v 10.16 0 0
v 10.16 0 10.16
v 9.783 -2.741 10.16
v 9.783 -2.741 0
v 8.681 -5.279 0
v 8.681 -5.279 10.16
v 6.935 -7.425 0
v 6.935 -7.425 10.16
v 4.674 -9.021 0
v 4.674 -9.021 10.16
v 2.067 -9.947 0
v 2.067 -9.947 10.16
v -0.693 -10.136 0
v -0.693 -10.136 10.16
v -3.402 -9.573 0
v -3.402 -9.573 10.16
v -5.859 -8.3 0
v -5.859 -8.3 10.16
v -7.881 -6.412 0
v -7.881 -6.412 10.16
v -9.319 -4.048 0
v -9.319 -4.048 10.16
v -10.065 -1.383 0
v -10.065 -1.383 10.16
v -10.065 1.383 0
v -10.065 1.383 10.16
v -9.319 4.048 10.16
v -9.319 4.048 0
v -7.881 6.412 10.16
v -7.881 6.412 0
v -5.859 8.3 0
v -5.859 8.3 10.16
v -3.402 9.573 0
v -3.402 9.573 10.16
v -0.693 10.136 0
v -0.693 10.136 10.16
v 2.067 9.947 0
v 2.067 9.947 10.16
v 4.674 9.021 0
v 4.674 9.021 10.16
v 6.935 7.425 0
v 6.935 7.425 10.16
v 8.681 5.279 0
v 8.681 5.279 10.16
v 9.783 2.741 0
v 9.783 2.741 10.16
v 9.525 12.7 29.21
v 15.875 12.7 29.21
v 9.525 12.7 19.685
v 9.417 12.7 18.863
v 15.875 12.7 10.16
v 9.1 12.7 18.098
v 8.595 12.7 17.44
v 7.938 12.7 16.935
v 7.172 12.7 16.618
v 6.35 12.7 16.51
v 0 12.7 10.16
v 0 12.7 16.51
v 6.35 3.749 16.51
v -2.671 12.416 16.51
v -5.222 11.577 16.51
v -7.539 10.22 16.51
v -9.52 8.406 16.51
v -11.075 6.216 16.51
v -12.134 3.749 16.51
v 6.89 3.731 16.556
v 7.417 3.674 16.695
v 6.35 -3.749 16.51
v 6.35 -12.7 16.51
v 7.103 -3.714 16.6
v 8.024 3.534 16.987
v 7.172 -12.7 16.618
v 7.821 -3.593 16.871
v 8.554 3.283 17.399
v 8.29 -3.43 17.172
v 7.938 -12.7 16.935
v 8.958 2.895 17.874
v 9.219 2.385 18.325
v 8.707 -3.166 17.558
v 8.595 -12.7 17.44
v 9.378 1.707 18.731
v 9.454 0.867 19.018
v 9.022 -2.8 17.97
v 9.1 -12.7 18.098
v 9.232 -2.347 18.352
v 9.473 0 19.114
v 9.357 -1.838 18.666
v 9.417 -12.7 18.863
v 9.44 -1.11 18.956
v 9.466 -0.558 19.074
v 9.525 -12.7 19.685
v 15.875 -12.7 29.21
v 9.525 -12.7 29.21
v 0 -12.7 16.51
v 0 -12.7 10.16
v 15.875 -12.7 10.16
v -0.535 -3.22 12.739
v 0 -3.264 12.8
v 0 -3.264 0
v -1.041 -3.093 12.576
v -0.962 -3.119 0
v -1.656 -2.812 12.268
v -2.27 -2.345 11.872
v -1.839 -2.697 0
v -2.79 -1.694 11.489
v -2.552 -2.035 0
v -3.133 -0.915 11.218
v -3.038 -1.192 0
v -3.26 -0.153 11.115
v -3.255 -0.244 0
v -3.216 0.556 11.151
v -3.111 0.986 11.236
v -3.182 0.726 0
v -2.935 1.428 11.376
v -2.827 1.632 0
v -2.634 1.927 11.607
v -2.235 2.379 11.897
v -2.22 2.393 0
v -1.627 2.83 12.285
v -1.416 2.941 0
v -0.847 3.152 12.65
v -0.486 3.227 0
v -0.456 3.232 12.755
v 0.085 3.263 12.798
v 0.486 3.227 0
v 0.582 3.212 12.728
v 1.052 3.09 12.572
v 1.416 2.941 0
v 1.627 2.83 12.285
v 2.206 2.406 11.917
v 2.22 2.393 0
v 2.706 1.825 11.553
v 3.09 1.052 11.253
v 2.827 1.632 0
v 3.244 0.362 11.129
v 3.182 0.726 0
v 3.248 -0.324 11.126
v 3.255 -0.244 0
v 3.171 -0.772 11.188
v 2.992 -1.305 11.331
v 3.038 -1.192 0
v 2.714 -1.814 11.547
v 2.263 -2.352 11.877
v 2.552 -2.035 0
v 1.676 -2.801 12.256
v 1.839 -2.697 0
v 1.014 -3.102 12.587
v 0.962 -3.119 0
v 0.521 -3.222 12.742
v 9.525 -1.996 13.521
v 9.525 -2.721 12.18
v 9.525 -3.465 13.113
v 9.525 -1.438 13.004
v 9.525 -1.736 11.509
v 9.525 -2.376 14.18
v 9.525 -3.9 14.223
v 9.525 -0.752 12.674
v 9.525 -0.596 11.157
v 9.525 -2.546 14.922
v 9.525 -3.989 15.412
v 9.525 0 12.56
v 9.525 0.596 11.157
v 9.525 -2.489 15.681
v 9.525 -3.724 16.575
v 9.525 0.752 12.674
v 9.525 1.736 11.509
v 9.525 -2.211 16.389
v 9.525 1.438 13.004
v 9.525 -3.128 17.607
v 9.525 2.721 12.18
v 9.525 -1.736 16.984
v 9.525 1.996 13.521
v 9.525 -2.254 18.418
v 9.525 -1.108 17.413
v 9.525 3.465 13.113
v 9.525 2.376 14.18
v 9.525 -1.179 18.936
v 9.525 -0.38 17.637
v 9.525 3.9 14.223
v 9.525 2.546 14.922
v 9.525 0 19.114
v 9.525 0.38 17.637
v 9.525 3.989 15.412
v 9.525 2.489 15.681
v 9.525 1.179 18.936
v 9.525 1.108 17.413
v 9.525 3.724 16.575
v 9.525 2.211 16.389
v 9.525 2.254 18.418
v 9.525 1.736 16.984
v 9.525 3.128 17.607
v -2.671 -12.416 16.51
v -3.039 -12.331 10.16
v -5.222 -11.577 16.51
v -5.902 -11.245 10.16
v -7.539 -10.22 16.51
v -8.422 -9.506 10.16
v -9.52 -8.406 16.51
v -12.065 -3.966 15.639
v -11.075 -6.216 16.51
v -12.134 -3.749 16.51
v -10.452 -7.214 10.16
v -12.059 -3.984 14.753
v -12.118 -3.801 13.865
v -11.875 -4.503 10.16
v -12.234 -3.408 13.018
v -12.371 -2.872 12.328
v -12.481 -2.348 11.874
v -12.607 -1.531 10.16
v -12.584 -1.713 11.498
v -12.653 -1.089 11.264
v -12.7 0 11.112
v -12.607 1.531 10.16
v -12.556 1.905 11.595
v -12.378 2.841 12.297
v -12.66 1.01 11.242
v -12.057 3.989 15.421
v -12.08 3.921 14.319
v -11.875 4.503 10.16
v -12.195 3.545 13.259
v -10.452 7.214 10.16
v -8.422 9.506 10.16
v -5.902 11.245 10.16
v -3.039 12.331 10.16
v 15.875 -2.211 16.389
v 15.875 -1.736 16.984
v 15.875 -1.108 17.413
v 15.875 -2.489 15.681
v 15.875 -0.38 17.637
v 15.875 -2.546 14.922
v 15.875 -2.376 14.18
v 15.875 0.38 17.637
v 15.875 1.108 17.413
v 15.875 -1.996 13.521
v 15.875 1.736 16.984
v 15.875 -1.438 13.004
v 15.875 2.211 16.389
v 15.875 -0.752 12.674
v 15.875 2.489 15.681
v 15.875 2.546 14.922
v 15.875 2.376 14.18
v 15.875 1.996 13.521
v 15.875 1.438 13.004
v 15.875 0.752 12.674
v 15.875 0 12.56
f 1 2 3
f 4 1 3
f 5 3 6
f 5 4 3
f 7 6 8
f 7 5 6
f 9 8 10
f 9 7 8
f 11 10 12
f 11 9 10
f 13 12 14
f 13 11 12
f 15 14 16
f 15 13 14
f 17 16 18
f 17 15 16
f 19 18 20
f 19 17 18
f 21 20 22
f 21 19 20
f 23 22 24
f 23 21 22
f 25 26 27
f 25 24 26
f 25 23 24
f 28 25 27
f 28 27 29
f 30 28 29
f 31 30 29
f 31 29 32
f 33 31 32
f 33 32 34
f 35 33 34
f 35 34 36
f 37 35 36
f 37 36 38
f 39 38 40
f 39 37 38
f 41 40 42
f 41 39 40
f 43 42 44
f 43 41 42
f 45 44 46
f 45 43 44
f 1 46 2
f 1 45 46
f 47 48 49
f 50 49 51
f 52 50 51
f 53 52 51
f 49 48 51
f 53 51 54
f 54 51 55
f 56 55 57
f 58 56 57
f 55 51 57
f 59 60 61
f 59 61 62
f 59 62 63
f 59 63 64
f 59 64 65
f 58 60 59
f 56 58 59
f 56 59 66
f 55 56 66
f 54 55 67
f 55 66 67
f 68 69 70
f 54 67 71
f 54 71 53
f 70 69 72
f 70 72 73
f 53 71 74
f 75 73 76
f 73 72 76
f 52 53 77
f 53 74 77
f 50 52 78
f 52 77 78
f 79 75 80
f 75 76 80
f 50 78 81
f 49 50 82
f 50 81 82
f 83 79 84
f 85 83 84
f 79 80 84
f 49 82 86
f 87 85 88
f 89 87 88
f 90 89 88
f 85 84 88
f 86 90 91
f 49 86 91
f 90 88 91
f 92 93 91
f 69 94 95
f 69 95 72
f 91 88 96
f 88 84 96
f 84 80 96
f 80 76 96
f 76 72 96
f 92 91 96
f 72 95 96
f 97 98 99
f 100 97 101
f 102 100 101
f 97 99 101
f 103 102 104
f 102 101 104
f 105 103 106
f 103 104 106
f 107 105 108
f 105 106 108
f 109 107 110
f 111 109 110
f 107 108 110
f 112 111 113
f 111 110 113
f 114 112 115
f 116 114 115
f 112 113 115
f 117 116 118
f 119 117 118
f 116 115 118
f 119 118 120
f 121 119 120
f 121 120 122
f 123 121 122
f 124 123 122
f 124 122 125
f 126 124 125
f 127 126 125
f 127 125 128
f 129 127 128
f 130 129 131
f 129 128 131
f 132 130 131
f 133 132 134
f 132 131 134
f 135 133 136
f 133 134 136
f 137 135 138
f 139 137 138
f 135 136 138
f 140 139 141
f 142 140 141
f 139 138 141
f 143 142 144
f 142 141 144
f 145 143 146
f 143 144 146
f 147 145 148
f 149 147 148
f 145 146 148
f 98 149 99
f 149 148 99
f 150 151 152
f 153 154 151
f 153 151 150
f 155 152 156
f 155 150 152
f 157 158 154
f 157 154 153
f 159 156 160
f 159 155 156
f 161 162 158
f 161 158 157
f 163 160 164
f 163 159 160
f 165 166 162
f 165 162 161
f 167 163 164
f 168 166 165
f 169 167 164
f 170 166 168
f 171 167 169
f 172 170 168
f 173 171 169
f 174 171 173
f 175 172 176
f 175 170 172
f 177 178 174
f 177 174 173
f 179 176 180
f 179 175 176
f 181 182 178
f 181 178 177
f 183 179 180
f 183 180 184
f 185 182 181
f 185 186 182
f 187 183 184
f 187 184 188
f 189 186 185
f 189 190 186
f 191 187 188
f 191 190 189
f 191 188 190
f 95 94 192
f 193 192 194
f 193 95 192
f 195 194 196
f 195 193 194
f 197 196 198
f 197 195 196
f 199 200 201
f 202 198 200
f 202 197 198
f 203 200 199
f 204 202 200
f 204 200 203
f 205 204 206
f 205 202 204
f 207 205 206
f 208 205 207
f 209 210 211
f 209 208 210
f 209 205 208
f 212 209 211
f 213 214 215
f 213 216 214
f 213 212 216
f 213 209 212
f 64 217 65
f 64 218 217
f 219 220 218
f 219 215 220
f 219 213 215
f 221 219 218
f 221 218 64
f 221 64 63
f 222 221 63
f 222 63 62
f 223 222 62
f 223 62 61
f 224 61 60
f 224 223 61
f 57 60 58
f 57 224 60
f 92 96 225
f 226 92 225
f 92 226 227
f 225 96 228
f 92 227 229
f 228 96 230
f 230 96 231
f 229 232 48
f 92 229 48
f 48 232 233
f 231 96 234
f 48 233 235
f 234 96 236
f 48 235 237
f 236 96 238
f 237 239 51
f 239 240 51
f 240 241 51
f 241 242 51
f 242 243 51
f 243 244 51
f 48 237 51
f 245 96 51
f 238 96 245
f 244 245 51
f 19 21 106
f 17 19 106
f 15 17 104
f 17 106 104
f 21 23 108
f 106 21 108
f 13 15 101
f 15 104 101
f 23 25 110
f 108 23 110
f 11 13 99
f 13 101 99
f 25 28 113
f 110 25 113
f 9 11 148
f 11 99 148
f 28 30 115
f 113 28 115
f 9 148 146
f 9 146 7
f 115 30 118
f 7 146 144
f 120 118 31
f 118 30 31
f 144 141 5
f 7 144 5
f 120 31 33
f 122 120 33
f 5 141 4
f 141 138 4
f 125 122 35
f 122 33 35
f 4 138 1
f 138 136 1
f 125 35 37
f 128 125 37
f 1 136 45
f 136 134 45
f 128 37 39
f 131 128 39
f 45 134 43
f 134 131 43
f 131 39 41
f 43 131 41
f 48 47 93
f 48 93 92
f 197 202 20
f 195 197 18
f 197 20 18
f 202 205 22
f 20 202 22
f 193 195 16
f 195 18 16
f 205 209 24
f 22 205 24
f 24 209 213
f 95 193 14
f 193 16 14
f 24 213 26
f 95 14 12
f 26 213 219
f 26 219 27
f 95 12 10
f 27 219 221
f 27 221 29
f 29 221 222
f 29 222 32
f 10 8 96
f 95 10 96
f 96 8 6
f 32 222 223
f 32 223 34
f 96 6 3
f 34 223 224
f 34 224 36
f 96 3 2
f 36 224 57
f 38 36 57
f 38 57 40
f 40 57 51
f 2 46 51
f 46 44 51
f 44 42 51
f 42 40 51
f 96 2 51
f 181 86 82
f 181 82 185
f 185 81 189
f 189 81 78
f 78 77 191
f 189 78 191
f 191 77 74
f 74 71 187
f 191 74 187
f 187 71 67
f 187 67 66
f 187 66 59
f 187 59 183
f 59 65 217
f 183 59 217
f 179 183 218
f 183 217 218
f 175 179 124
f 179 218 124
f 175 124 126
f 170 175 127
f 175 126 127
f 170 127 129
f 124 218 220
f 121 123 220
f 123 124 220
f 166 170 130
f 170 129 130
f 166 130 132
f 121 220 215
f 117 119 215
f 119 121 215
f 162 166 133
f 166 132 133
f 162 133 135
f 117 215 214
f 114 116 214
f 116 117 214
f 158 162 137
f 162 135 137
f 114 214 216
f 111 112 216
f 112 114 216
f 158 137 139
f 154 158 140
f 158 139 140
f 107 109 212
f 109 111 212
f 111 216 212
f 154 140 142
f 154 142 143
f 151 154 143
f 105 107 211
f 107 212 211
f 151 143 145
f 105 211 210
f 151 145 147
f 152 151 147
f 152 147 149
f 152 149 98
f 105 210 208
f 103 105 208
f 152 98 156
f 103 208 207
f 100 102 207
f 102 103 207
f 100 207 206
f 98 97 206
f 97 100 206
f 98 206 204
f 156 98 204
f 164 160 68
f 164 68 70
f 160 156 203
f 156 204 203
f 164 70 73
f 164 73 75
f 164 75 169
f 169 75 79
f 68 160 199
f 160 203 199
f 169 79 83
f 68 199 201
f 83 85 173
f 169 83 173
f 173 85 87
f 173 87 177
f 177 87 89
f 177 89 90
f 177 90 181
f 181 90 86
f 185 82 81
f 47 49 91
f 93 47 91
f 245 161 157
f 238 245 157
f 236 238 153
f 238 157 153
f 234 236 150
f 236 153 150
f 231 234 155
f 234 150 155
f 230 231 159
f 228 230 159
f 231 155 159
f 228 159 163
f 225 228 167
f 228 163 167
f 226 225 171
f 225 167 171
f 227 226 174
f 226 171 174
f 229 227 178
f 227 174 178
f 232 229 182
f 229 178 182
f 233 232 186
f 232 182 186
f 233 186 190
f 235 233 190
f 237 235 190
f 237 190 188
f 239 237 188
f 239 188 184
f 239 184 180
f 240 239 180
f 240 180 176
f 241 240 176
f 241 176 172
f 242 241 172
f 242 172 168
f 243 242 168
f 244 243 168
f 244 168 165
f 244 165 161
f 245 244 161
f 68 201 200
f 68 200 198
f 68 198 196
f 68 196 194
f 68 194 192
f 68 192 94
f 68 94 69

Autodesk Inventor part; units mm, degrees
ref_plane "YZ Plane" through (0, 0, 0) normal (1, 0, 0) x (0, 1, 0)
ref_plane "XZ Plane" through (0, 0, 0) normal (0, 1, 0) x (-1, 0, 0)
ref_plane "XY Plane" through (0, 0, 0) normal (0, 0, 1) x (1, 0, 0)
sketch "Sketch1" plane through (0, 0, 0) normal (0, 0, 1) x (1, 0, 0)
  circle A0 centre (0, 0) radius 10.16
  circle A1 centre (0, 0) radius 8.7376
  dimension "d0" = 20.32
  dimension "d6" = 17.4752
extrude "Extrusion1" add sketch "Sketch1" along normal blind 10.16 contours A0 | A1
sketch "Sketch2" plane through (0, 0, 10.16) normal (0, 0, 1) x (1, 0, 0)
  circle A0 centre (0, 0) radius 10.16 projected
  circle A1 centre (0, 0) radius 12.7 construction
  line L0 (0, 12.7) -> (15.875, 12.7)
  line L1 (15.875, 12.7) -> (15.875, -12.7)
  line L2 (15.875, -12.7) -> (0, -12.7)
  arc A2 (0, 12.7) -> (0, -12.7) centre (0, 0) ccw
  point P0 (15.875, 0)
  dimension "d3" = 2.54
  dimension "d14" = 15.875
  dimension "d35" = 25.4
extrude "Extrusion2" add sketch "Sketch2" along normal blind 6.35 contours A0 | L0 L1 L2 A2
sketch "Sketch4" plane through (0, 0, 16.51) normal (0, 0, 1) x (1, 0, 0)
  arc A0 (0, 12.7) -> (0, -12.7) centre (0, 0) ccw projected
hole "Hole2" at (0, 0, 16.51) direction (0, 0, -1) diameter 6.5278 end through all clearance for "Flat Head Machine Screw (82)" size "1/4" standard "Ansi Unified Screw Threads"
sketch "Sketch5" plane through (0, 0, 16.51) normal (0, 0, 1) x (1, 0, 0)
  line L0 (15.875, 12.7) -> (0, 12.7) projected
  line L1 (0, -12.7) -> (15.875, -12.7) projected
  line L2 (15.875, 12.7) -> (9.525, 12.7)
  line L3 (9.525, 12.7) -> (9.525, -12.7)
  line L4 (9.525, -12.7) -> (15.875, -12.7)
  line L5 (15.875, -12.7) -> (15.875, 12.7)
  point P0 (0, 0)
  dimension "d22" = 6.35
extrude "Extrusion3" add sketch "Sketch5" along normal blind 12.7
fillet "Fillet1" radius 3.175 1 edges at (9.525, 0, 16.51)
sketch "Sketch6" plane through (15.875, -12.7, 10.16) normal (1, 0, 0) x (0, 0, -1)
  line L0 (-12.7, 19.05) -> (-12.7, 6.35) construction
  line L1 (-19.05, 0) -> (-19.05, 25.4) construction
  line L2 (0, 25.4) -> (-19.05, 25.4) construction
  point P0 (10.16, 12.7)
  point P1 (-12.7, 12.7)
  point P2 (-19.05, 12.7)
  point P3 (-9.525, 25.4)
  point P4 (-4.953, 12.7)
  dimension "d26" = 12.7
  dimension "d34" = 6.35
  dimension "d36" = 14.097
hole "Hole3" at (15.875, 0, 15.113) direction (-1, 0, 0) diameter 5.1054 end through all clearance for "Flat Head Machine Screw (82)" size "#10" standard "Ansi Unified Screw Threads"
ref_plane "Work Plane1" through (-12.7, -12.7, 29.21) normal (-1, 0, 0) x (0, 0, 1)
sketch "Sketch7" plane through (-12.7, -12.7, 29.21) normal (-1, 0, 0) x (0, 0, 1)
  line L0 (-19.05, 12.7) -> (-16.6497, 12.7) construction
  line L1 (-19.05, 12.7) -> (-16.6497, 12.7) construction
  circle A0 centre (-14.097, 12.7) radius 2.5527 construction
  circle A1 centre (-14.097, 12.7) radius 4.0005
  point P0 (-29.21, 12.7)
  point P1 (-12.7, 10.5635)
  point P2 (-12.7, 14.8365)
  dimension "d38" = 8.001
extrude "Extrusion4" cut sketch "Sketch7" against normal up to surface (22.225 mm away)
properties part number "constant force Spring Holder 2" material "ABS Plastic"
